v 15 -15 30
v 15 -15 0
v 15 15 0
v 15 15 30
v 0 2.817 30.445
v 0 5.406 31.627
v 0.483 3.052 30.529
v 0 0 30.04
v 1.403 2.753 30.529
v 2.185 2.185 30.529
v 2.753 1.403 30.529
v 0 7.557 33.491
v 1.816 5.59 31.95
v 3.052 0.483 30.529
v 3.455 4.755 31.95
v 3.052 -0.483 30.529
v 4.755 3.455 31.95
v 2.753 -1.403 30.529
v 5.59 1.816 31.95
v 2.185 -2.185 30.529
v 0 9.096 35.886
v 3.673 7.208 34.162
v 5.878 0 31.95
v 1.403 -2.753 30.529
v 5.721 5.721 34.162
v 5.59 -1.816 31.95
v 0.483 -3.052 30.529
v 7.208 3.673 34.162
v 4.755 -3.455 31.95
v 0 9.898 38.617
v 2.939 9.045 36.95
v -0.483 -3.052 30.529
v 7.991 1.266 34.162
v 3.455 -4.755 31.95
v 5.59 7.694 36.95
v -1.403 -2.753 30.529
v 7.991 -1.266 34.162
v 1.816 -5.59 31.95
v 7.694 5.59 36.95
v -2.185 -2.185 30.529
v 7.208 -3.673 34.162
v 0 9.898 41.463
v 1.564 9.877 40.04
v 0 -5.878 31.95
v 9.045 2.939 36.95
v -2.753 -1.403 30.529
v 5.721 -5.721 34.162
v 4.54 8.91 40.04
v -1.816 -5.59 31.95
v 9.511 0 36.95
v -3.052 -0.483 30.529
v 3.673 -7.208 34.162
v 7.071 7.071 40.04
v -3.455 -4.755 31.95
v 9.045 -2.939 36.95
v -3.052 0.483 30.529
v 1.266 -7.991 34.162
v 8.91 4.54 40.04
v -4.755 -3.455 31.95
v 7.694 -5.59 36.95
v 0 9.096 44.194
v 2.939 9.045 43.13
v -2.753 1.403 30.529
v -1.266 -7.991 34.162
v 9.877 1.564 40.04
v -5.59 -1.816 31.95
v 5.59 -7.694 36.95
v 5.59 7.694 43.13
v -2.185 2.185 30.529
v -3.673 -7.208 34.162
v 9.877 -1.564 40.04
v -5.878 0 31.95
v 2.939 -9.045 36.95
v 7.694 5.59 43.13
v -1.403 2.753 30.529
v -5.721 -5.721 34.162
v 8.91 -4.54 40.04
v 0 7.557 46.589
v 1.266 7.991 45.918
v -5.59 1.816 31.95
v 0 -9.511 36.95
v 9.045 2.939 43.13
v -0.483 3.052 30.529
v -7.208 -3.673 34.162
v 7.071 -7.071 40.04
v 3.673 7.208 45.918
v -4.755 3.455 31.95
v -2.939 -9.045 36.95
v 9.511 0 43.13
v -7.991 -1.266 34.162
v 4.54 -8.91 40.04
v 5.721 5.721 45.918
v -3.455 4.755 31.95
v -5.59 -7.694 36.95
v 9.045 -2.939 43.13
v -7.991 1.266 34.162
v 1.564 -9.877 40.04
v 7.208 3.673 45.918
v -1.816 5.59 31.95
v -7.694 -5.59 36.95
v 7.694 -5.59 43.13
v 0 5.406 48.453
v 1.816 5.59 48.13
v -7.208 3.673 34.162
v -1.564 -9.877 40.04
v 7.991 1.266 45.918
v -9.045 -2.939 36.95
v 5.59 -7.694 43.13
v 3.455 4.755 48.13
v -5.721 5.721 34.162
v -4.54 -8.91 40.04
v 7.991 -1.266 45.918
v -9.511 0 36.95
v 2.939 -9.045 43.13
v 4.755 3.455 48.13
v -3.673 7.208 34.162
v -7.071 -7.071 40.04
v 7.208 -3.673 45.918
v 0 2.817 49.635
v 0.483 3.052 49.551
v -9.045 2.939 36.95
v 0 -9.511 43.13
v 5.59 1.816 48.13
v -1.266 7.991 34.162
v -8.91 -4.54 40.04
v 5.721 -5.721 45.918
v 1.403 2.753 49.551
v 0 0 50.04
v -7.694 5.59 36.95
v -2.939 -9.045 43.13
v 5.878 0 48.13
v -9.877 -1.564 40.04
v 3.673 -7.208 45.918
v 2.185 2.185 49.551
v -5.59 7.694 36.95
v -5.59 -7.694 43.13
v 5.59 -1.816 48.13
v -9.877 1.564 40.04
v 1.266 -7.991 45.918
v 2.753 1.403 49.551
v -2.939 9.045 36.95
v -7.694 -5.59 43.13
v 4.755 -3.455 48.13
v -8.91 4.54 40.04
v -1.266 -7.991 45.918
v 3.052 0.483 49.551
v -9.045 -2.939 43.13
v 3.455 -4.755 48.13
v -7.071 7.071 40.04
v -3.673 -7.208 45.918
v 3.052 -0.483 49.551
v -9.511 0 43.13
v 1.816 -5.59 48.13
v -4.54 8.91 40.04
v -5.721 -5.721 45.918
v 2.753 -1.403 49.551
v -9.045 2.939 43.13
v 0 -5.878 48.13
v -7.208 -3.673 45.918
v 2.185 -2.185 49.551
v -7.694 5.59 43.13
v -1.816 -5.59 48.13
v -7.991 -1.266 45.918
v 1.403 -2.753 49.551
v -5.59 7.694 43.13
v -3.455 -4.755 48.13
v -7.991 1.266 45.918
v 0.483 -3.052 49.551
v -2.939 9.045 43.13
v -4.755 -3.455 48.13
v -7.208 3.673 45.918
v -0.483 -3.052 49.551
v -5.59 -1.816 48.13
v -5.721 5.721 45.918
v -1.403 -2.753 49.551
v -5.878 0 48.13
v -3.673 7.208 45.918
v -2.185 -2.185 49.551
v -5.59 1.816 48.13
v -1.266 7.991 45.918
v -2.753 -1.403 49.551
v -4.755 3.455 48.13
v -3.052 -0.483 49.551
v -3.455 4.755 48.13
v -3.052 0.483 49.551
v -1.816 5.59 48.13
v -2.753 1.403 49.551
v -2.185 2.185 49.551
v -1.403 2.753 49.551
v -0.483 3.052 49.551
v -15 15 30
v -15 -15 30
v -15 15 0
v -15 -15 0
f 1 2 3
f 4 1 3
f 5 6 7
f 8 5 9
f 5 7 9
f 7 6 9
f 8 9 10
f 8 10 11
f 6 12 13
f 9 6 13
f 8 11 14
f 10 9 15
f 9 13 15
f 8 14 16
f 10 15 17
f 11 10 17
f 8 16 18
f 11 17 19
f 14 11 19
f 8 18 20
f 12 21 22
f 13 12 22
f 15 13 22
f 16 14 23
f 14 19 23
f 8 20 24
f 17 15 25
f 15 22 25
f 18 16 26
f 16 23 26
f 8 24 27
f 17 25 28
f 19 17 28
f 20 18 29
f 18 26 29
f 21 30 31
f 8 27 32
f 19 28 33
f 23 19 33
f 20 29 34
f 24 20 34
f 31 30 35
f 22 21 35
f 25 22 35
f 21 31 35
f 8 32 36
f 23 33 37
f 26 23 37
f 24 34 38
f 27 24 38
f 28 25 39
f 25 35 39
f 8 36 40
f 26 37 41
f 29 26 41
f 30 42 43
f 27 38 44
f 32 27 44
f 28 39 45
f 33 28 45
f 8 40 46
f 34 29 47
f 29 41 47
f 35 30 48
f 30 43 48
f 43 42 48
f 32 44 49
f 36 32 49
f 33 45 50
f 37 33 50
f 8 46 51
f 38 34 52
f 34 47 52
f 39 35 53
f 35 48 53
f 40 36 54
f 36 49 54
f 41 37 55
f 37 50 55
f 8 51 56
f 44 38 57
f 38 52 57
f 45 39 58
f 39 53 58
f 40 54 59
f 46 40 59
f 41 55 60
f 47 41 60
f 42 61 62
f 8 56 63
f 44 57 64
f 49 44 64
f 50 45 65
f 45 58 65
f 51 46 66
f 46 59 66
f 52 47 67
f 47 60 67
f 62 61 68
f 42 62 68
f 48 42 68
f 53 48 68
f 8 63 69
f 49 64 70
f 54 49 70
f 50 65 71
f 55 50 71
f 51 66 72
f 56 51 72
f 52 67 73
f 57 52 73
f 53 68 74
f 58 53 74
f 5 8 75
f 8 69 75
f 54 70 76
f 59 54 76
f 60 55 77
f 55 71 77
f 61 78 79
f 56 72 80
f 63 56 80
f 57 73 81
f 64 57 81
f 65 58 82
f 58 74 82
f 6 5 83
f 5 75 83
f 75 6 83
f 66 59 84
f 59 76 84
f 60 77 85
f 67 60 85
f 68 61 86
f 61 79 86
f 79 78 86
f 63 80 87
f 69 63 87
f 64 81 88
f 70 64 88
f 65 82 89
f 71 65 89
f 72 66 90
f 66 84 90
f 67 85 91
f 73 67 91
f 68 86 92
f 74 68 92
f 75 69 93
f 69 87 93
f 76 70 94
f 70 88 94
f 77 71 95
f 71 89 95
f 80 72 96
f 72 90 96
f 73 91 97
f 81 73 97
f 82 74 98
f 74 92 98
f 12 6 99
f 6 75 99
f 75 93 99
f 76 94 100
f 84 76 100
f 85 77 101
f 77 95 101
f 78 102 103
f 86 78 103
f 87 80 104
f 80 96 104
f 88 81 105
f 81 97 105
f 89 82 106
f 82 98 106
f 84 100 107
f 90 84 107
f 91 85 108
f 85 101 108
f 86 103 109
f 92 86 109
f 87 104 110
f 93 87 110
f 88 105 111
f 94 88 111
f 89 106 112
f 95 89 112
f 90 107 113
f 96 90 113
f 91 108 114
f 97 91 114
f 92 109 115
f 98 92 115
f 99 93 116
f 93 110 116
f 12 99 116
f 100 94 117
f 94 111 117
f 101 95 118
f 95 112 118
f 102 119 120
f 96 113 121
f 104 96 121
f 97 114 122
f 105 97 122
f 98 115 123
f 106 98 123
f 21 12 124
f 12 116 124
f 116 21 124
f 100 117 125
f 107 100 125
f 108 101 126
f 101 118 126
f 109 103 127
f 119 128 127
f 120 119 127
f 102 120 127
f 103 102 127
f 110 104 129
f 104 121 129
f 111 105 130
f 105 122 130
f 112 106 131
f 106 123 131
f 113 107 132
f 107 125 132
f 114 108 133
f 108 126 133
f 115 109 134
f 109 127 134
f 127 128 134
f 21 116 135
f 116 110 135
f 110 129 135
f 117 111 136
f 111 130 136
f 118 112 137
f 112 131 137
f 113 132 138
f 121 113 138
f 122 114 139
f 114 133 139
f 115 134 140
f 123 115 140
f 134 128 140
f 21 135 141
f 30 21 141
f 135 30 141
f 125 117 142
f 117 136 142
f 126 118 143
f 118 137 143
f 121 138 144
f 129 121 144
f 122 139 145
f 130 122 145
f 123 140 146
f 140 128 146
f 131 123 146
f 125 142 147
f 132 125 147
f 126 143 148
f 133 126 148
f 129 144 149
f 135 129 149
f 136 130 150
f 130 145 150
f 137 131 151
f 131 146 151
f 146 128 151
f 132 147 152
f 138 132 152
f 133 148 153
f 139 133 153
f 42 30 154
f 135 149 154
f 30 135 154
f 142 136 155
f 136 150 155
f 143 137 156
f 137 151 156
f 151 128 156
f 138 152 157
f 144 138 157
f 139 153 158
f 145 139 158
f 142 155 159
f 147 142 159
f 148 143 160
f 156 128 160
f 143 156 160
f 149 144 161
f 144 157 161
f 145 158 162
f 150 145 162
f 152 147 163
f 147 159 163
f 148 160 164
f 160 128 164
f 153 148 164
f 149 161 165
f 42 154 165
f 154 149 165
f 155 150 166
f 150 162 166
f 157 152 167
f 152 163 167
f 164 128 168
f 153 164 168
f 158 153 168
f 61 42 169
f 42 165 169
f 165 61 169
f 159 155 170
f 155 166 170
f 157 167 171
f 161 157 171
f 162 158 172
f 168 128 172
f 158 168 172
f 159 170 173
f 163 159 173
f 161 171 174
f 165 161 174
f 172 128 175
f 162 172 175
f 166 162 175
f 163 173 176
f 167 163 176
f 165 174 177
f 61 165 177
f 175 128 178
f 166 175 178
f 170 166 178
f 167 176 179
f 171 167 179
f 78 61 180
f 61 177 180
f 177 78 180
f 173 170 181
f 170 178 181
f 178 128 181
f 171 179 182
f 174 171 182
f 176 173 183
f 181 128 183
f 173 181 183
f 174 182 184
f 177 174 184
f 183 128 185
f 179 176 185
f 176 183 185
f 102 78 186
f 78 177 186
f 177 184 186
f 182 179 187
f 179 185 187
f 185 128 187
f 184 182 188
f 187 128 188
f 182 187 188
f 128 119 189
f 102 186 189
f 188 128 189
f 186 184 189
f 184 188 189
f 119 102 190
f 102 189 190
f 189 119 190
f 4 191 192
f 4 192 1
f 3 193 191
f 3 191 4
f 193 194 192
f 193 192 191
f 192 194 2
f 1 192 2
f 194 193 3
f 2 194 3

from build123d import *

# Parameters (mm, degrees)
F0_W     = 30
F0_H     = 30
F1_DEPTH = 30


with BuildPart() as f1:
    # F0 (on Top) → F1 (new body)
    with BuildSketch(Plane.XY):
        Rectangle(F0_W, F0_H)
    extrude(amount=F1_DEPTH)


with BuildPart() as f4:
    # F3 (on Right) → F4 (revolve)
    with BuildSketch(Plane.YZ):
        with BuildLine():
            Line((0, 50.040035), (0, 30.040035))
            ThreePointArc((0, 30.040035), (10, 40.040035), (0, 50.040035))
        make_face()
    revolve(axis=Axis((0, 0, 40.040035), (0, 0, -1)))


solid = Compound([f1.part, f4.part])
